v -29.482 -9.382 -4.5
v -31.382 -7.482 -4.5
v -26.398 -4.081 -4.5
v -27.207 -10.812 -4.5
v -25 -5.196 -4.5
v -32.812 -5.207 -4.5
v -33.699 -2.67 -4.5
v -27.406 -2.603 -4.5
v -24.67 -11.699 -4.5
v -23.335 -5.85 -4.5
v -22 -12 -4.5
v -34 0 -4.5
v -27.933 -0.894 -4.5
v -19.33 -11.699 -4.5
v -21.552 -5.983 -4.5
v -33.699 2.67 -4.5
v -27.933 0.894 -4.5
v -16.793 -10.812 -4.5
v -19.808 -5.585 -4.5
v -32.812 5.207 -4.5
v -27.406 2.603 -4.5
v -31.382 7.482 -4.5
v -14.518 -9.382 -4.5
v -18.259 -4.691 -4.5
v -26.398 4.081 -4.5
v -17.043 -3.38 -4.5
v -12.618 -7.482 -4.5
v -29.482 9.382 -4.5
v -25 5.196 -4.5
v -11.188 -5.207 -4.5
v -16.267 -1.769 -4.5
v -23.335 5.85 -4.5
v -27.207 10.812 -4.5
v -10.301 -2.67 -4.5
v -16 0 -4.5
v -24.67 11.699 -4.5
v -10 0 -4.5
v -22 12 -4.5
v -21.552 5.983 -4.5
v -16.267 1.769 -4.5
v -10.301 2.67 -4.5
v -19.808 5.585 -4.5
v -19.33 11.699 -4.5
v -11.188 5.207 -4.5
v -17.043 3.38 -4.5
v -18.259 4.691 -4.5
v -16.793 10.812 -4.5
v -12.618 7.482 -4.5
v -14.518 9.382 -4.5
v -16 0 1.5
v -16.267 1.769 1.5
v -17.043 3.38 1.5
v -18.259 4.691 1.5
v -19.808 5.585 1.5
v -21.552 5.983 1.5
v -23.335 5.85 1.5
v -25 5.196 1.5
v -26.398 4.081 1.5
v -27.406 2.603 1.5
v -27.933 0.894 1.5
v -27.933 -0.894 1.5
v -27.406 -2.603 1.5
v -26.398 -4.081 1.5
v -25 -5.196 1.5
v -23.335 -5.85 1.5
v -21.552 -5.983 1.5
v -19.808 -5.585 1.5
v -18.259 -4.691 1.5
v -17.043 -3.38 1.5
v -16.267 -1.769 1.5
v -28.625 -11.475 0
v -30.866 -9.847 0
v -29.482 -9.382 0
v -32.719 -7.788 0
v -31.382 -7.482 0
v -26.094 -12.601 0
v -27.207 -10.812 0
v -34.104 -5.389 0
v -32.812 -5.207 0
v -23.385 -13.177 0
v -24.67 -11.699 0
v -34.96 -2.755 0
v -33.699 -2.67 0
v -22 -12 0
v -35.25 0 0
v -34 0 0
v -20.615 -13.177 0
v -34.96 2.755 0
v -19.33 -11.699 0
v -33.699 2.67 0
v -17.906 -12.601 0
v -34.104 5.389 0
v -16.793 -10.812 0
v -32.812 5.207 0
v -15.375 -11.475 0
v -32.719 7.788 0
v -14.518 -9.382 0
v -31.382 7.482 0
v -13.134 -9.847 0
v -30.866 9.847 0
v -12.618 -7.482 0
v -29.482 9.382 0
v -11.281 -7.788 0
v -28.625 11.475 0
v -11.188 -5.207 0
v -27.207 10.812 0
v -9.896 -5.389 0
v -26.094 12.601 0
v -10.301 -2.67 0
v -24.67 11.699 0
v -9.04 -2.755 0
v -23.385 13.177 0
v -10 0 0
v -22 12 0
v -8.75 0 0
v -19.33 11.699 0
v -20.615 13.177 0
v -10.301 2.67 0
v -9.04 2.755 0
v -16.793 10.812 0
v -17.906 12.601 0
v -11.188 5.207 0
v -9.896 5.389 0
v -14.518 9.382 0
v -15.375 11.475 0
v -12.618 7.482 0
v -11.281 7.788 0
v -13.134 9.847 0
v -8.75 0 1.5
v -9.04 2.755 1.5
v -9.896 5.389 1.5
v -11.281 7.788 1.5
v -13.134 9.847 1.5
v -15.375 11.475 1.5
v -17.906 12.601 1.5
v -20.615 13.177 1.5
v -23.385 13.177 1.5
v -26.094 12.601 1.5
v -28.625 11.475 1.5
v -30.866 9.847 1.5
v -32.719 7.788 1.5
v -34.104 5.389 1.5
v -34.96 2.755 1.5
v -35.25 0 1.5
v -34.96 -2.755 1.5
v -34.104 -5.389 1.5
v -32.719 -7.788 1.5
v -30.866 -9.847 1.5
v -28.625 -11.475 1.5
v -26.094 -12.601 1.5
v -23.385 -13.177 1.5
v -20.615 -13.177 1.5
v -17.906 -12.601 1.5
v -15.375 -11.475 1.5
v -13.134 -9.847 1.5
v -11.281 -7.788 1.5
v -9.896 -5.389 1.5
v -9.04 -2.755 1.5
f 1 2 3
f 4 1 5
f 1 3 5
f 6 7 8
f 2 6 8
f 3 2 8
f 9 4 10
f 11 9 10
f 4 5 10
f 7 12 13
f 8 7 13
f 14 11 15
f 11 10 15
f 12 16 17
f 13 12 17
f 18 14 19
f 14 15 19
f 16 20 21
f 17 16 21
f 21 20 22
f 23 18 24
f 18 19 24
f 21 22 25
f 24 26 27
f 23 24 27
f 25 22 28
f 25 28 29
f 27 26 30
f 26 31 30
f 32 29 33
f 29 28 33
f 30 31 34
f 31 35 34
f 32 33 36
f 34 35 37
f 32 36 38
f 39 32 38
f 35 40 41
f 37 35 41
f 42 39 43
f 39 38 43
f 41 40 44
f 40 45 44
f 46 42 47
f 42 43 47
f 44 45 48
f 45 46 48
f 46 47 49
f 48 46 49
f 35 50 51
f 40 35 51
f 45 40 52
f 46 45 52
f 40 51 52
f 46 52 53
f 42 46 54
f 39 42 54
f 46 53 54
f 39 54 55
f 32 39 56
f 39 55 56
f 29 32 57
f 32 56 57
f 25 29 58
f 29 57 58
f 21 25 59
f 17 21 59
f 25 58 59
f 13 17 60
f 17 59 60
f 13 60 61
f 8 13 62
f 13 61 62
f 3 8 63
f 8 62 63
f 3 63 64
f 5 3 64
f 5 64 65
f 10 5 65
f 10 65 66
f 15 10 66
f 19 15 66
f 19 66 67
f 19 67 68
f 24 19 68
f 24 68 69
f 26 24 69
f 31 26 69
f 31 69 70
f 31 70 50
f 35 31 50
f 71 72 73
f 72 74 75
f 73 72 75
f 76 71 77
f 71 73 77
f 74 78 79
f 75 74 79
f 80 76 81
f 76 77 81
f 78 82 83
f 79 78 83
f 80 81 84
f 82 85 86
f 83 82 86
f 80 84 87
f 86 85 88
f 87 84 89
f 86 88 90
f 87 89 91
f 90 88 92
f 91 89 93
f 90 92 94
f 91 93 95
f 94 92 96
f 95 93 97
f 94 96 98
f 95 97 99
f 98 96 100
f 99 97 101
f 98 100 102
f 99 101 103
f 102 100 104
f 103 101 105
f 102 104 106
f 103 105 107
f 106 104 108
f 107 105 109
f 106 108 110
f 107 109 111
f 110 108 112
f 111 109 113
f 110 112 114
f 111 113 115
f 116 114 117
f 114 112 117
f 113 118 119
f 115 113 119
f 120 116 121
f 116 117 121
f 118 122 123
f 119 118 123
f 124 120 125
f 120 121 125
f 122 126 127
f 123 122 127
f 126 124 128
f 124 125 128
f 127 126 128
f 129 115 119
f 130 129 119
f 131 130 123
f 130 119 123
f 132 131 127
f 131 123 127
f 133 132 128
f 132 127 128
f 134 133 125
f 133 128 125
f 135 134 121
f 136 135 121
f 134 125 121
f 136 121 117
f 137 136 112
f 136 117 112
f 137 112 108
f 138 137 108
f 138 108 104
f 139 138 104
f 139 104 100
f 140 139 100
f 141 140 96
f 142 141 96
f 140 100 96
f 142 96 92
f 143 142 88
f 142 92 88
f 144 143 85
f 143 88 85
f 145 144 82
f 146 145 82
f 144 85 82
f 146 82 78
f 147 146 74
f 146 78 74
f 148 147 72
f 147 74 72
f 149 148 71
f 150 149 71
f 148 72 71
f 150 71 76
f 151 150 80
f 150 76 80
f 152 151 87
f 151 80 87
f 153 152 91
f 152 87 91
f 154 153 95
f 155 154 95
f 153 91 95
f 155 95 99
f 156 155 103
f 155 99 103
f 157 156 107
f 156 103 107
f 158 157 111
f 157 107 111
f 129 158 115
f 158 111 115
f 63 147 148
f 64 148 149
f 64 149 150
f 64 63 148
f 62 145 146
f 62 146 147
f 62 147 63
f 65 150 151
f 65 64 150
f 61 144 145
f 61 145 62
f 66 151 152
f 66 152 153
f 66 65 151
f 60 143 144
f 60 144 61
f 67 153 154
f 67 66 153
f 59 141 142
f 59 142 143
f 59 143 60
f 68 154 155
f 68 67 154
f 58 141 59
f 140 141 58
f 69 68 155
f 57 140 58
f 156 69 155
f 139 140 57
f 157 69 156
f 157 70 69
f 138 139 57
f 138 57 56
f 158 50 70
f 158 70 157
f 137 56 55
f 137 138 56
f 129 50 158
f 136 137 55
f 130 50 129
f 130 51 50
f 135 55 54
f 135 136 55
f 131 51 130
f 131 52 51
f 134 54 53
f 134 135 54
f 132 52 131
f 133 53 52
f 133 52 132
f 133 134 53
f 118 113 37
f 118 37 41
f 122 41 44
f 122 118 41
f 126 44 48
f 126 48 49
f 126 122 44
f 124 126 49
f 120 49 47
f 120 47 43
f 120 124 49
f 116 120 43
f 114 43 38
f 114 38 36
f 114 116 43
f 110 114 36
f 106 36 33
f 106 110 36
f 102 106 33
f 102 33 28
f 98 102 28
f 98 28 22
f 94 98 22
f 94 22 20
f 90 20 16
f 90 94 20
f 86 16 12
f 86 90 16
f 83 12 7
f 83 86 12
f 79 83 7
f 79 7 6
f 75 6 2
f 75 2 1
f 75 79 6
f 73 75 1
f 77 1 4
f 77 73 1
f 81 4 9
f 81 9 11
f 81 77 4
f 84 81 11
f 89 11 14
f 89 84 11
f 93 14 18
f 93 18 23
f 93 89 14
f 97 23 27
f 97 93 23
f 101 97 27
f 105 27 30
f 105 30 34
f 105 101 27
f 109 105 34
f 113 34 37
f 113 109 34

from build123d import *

# Parameters (mm, degrees)
SKETCH_1_R          = 12
EXTRUDE_1_DEPTH     = 4.5
SKETCH_2_R          = 13.25
EXTRUDE_2_DEPTH     = 1.5
SKETCH_3_R          = 6
CUT_EXTRUDE_1_DEPTH = 39.132990966


with BuildPart() as part:
    # ｽｹｯﾁ1 → 押し出し1 (new body)
    with BuildSketch(Plane.XY):
        with Locations((-22, 0)):
            Circle(SKETCH_1_R)
    extrude(amount=-EXTRUDE_1_DEPTH)

    # ｽｹｯﾁ2 → 押し出し2 (add)
    with BuildSketch(Plane.XY):
        with Locations((-22, 0)):
            Circle(SKETCH_2_R)
    extrude(amount=EXTRUDE_2_DEPTH)

    # ｽｹｯﾁ3 → ｶｯﾄ - 押し出し1 (cut, through all)
    with BuildSketch(Plane.XY.offset(1.5)):
        with Locations((-22, 0)):
            Circle(SKETCH_3_R)
    extrude(amount=-CUT_EXTRUDE_1_DEPTH, mode=Mode.SUBTRACT)


solid = part.part
